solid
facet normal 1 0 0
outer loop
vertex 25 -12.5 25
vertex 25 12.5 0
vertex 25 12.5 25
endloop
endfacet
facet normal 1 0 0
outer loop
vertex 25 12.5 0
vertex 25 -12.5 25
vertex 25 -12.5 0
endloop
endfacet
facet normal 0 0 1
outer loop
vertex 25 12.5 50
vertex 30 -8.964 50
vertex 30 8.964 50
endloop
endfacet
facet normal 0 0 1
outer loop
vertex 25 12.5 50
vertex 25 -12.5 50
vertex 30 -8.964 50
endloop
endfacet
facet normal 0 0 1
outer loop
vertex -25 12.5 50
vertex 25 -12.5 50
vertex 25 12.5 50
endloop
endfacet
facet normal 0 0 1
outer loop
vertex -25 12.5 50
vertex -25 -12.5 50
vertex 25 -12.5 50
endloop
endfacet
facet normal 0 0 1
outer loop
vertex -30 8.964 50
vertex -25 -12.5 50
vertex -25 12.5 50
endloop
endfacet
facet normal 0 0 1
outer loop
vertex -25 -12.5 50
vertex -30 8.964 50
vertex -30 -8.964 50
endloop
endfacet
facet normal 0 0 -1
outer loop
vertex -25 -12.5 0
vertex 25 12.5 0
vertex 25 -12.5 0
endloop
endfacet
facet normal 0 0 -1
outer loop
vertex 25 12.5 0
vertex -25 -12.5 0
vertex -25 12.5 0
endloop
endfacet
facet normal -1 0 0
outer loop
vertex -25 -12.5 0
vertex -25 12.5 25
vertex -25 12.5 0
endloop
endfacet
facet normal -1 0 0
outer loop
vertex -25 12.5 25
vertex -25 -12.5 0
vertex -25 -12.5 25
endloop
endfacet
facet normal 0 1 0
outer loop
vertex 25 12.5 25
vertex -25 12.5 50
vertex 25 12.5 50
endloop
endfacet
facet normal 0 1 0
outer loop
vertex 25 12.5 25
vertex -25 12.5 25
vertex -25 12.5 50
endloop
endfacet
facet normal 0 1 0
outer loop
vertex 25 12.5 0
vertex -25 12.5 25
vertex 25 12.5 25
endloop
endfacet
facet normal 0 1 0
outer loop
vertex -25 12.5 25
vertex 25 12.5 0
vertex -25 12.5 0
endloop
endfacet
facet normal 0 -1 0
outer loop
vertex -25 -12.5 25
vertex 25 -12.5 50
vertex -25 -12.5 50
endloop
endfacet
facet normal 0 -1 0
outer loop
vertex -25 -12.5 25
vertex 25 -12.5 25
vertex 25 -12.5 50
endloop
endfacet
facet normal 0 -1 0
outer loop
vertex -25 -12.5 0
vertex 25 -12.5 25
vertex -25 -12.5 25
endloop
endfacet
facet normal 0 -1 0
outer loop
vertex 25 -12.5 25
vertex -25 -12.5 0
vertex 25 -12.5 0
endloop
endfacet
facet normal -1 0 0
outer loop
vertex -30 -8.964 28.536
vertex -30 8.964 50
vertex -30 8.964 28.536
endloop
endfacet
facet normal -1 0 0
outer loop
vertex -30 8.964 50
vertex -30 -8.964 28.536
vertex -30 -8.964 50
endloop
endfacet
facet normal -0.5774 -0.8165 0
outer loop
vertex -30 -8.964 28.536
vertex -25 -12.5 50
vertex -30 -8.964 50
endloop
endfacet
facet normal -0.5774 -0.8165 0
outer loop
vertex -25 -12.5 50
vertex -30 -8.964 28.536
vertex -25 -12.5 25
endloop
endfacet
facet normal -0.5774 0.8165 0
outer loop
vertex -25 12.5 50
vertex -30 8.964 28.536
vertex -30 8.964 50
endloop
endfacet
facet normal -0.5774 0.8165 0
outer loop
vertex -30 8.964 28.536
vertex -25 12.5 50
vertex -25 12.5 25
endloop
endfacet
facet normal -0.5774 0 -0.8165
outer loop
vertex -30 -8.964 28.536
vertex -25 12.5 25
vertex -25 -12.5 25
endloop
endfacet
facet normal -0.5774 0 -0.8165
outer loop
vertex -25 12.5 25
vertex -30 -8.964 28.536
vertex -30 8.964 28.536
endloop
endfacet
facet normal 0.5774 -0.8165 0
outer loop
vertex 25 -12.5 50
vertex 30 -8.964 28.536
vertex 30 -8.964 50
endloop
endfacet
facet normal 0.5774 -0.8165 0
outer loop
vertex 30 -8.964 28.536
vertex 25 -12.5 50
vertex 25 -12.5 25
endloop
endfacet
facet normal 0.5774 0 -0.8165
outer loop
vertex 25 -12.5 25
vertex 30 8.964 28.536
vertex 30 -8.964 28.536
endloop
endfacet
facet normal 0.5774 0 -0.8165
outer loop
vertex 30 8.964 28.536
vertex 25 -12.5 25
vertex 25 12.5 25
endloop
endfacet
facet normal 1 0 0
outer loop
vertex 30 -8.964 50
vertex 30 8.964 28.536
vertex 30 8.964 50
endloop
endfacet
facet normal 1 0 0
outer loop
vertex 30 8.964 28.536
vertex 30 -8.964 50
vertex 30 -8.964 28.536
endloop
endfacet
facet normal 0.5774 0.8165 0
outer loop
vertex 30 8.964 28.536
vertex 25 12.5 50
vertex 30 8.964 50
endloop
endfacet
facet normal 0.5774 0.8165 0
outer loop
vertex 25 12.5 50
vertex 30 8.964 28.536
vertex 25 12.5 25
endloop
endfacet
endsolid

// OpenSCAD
// file: plus/parts.scad
//////////////////////////////////////////////////////////////////////////////////////////////////
// parts [OBLOBOTS] 
// v.04 
// partes que estarán integradas en los volúmenes
//////////////////////////////////////////////////////////////////////////////////////////////////
// (c) Jorge Medal (@oblomobka) - Sara Alvarellos (@trecedejunio) Sep 2013
//////////////////////////////////////////////////////////////////////////////////////////////////
// GPL license ???
//////////////////////////////////////////////////////////////////////////////////////////////////

use <union.scad>

//-- sizes Buttons

PON = [11.7,2.35,0,0,11.7,1.6 ];	// [ diametro H, espesor H, d centro H, saliente H, diámetro M, espesor M]
PRY = [11,2.2,0,0,11,2.0 ];		// [ diametro H, espesor H, d centro H, saliente H, diámetro M, espesor M]
COS11 = [10,1.3,3.5,3,9.6,0.7];	// [ diámetro H, espesor H, d centro H, saliente H, diámetro M, espesor M]

////////////////////////////////////////////////////////
////////////////////// VOLÚMENES /////////////////////////

// --- Cono truncado ciego falda 45º
module blindcone (d=50	// diámetro del cono
				){

$fn=50;
union(){
	difference(){
		cylinder (r1=d/2,r2=d/4,h=d/4);
		translate([0,0,(d/4-7*d/32)+0.1])
			cylinder (r1=0,r2=7*d/32,h=7*d/32);
		}
	cylinder (r1=7*d/32,r2=d/32,h=7*d/32);
	}
}


// --- Piramide circunscrita en un círculo definido en las variables
module pyramid_C (	n=4,			// nº lados de la base de la pirámide	
					d1=20,		// diámetro del círculo-base donde se inscribe la pirámide
					d2=0,		// diámetro del círculo-punta donde se inscribe la pirámide
					h=10			// altura de la pirámide
					){

if(n%2==0){
rotate([0,0,180/n])
	cylinder (r1=d1/2/cos(180/n), r2=d2/2/cos(180/n), h=h, $fn=n);
}
else{
	rotate([0,0,90/n])
		cylinder (r1=d1/2/cos(180/n), r2=d2/2/cos(180/n), h=h, $fn=n);
}

}

// ------- pyramid_C (n=n,d1=d1,d2=d2,h=h); -----------------

// --- Prisma circunscrit0 en un círculo definido en las variables
module prism_C (	n=4,			// nº lados de la base del prisma
				d=20,		// diámetro del círculo donde se inscribe el prisma
				h=10			// altura del prisma
				){
if(n%2==0){
rotate([0,0,180/n])
	cylinder (r=d/2/cos(180/n), h=h, $fn=n);
}
else{
	rotate([0,0,90/n])
	cylinder (r=d/2/cos(180/n), h=h, $fn=n);
}

}

// ------- prism_C (n=n,d=d,h=h); -----------------


////////////////////////////////////////////////////////
////////////////////// DECORACIÓN /////////////////////////

module badge_f (	n=5,			// nº lados de la base de la pirámide	
				d=20,		// diámetro del círculo-base donde se inscribe la pirámide
				h=3,			// altura de la pirámide
				button=0,	// si =1 se construira un rebaje para un botón automático
				typ			// tipo de botón automático
				){
d2=d-2*h;

if(n%2==0){
	rotate([0,0,180/n])
		cylinder (r1=d/2/cos(180/n), r2=d2/2/cos(180/n), h=h, $fn=n);
	}
	else{
		rotate([0,0,90/n])
			cylinder (r1=d/2/cos(180/n), r2=d2/2/cos(180/n), h=h, $fn=n);
		}

	if(button==1){
		translate([0,0,h])
			auto_button_m0(typ);
		}
}
// ------- shield_f (n=n,d=d,h=h,button=button,typ=[typ]); -----------------


module badge_m (	n=5,			// nº lados de la base de la pirámide	
				d=19,		// diámetro del círculo-base donde se inscribe la pirámide
				h=3,			// altura de la pirámide
				B=1,			// Tipo de escudo
				button=0,	// si =1 se construira un rebaje para un botón automático
				typ			// tipo de botón automático
				){
$fn=50;

d2=d-2*h;

difference(){
	union(){
		pyramid_C (n=n,d1=d,d2=d2,h=h);
		if(B==1||B==2){
			mirror([0,0,1])
				hull(){
					prism_C (n=n,d=d,h=0.5);
	
					translate([0,0,d/4])
						if(B==1){
							cylinder(r=d/4,h=1);
							}
							else{
								if(B==2){
									sphere(d/4);
								}
							}
					}
				}
		else{
		if(B==3){
			mirror([0,0,1])
				difference(){
					prism_C(d=d,h=6,n=n);
					translate ([0,0,1])
						prism_C(d=d-5,h=6,n=n);
					}
			}	
		}
	}
	if(button==1){
		translate([0,0,h])
			rotate([0,180,0])
				auto_button_f0(typ);
		}
	else{}
	if(B==1){
		translate([0,0,-(d/4+3)])
			prism_C(d=d/3,h=6,n=n);
		}
	}
}

// ------- badge_m (B=B,n=n,d=d,h=h,button=button,typ=[typ]); -----------------

/////////////////////////////////////////////////////////
////////// MÓDULOS PARA ALOJAR LEDS  ////////////////////

// Cono truncado hueco. Funciona como alojamiento para un led
module ledsocket (	ledn=5,		// Valor nominal del led
					h=4			// altura del cono						
					){
$fn=50;
hi=1.2;
edge=1;					// borde del ojo
ledr=ledn+1;
socket=ledr+1;
lash=socket+2*edge;
fring=1;					// factor que define la falda del cono 1=45º
ring=lash+2*h*fring;

	difference(){

		cylinder(r2=lash/2,r1=ring/2,h=h);

		union(){
			cylinder(r2=ledr/2,r1=socket/2,h=hi+0.1);

			translate([0,0,hi])
				cylinder(r2=socket/2,r1=ledr/2,h=h-hi);

			translate([0,0,h-0.1])
				cylinder(r=socket/2, h=2);

			translate([0,0,-2])
				cylinder(r=socket/2, h=2.1);
		}
	}
}


// Cono truncado hueco. Funciona como alojamiento para un led
module ledsocket_exp(	ledn=5,		// Valor nominal del led
					h=4,			// altura del cono
					exp1=-25,	// [-45:45]	factor para la expresión
					exp2=50		// [1:100]	factor para la expresión
					){
$fn=50;
hi=1.2;
ledr=ledn+1;
socket=ledr+1;
edge=1;							// borde del ojo
lash=socket+2*edge;
fring=1;							// factor que define la falda del cono 1=45º
ring=lash+2*h*fring;

eyer2=socket+2*edge;				// Variable auxiliar
eyer1=eyer2+2*h*fring;			// Variable auxiliar

cut=((eyer1-eyer2)/2)*exp2/100;		// Variable auxiliar

difference(){	
	difference(){
		cylinder(r2=lash/2,r1=ring/2,h=h);
		union(){
			cylinder(r2=ledr/2,r1=socket/2,h=hi+0.1);
			translate([0,0,hi])
				cylinder(r2=socket/2,r1=ledr/2,h=h-hi);
			translate([0,0,h-0.1])
				cylinder(r=socket/2, h=2);
			translate([0,0,-0.1])
				cylinder(r=socket/2, h=0.2);
			}
		}
	translate ([0,0,h/2])
		rotate ([0,0,exp1])
			translate ([0,eyer1/2+eyer2/2+0.5+cut,0])	
				cube ([eyer1,eyer1,eyer1],center=true);						
	}
}

// -------------- Fin de los módulos para alojar leds ---------------------
// ------------------------------------------------------------------------


/////////////////////////////////////////////////////////////////////////
/////////////////// Ejemplos de aplicación //////////////////////////////

*badge_f(button=1,typ=COS11);

translate ([0,-30,0])
badge_m(B=1, button=1,typ=COS11);

translate ([0,-60,0])
badge_m(B=2,button=1,typ=COS11);

translate ([0,-90,0])
badge_m(B=3,button=1,typ=COS11);


blindcone (d=25);	
translate ([0,30,0])
	blindcone (d=12);	
translate ([0,60,0])
	blindcone (d=30);	

translate ([40,0,0])
	pyramid_C (n=6,d1=20,d2=10,h=10);
translate ([40,30,0])
	pyramid_C (n=4,d1=30,d2=0,h=20);
translate ([40,60,0])
	pyramid_C (n=5,d1=23,d2=5,h=34);
					
translate ([-40,0,0])
	ledsocket_exp (ledn=5,h=6,exp1=-45,exp2=20);


translate ([-40,30,0])
	ledsocket_exp (ledn=5,h=4,exp1=25,exp2=40);
translate ([-40,60,0])
	ledsocket_exp (ledn=5,h=2,exp1=0,exp2=100);
// file: plus/union.scad
//////////////////////////////////////////////////////////////////////////////////////////////////
// union [OBLOBOTS] 
// v.04 
// elementos de unión entre las partes del cuerpo de los oblobots
//////////////////////////////////////////////////////////////////////////////////////////////////
// (c) Jorge Medal (@oblomobka) - Sara Alvarellos (@trecedejunio) Sep 2013
//////////////////////////////////////////////////////////////////////////////////////////////////
// GPL license
//////////////////////////////////////////////////////////////////////////////////////////////////

use <parts.scad>

//////////////////////////////////////////////////////
////////// MÓDULOS TIPO MACHO-HEMBRA /////////////////

/////////// MACHOS ///////////

// ---- Pin cilíndrico simple. Tiene un ligero achafalnado en la punta
module pin0(	d=15,	// diámetro del pin
			h=10	,	// longitud del pin
			db1=0,	// diámetro de la base1
			db2=0,	// diámetro de la base2 si es =db1 es un cilindro
			hb=0	,	// longitud de la base
			n=32		// número de lados del prisma base
			){
$fn=50;
h1=1;
h2=h-h1;

translate([0,0,hb])
union(){
	cylinder(r=d/2, h=h2);
	translate([0,0,h2])
		cylinder (r1=d/2,r2=(d-2)/2,h=h1);
	translate([0,0,-hb])
	pyramid_C(d1=db1,d2=db2,h=hb,n=n);
	}
	
}

// --- pin que se ensancha en la punta
module pin2 (	d=8,	// diámetro del taladro
				h=20	,	// longitud del pin
				db1=0,	// diámetro de la base1
				db2=0,	// diámetro de la base2 si es =db1 es un cilindro
				hb=0	,	// longitud de la base
				n=0,		// número de lados del prisma base
				k=0.3,	// marca el espesor de la pestaña
				s=0.3	// holgura
				){
$fn=50;

dp=d+0.8;
hp=h/10;
space=s;
k1=d*k;

translate([0,0,hb])
difference(){
union(){
cylinder(r=(d-space)/2,h=h/2);
translate([0,0,h/2])
cylinder(r1=(d-space)/2,r2=(dp-space)/2,h=h/2-h/10);
translate([0,0,h-h/10])
	cylinder (r1=(dp-space)/2,r2=(d-1)/2,h=h/10-0.5);
translate([0,0,-hb])
	pyramid_C(d1=db1,d2=db2,h=hb,n=n);
}

translate([0,0,h])
for(i=[90,180]){
	rotate([0,0,i])
		union(){
			cube([2*d,d/8,h],center=true);
			translate([0,0,-h/2])rotate([90,0,0])
				cylinder(r=d/16,h=2*d,center=true);
			}
	}

cylinder(r=k1/2,h=3*h, center=true);
}

}


////////// HEMBRAS ////////////////////

// --- Taladro poligonal para volumen macizo
module drill0 (	d=12,	// diámetro del taladro
				h=6		// profundidad del taladro
				){
$fn=50;
s=6;			// Nº de lados del taladro (el taladro es poligonal, normalmente será hexagonal)

translate([0,0,-0.2])
	intersection(){
		cylinder (r=(d/cos(180/s))/2,h=h,$fn=s);
		cylinder (r=(d+d/20)/2,h=h);
	}
}

// --- Taladro poligonal para volumen hueco - Añade una caña donde alojar el pin
module drill1 (	d=12,	// diámetro del taladro
				h=15		// profundidad del taladro
				){
$fn=50;
s=6;			// Nº de lados del taladro (el taladro es poligonal, normalmente será hexagonal)
e=3;			// espesor de la caña donde se alojará el pin correspondiente

difference(){
	child (0);
	cylinder (r=(d+2*e)/2,h=2*h,center=true);	
	}

difference(){
	cylinder (r=(d+e)/2,h=h);
	translate([0,0,-1])
		intersection(){
			cylinder (r=(d/cos(180/s))/2,h=h,$fn=s);
			cylinder (r=(d+d/20)/2,h=h);
		}
	}
}


// --- Taladro que se ensancha en la punta
module drill2 (	d=12,	// diámetro del taladro
				h=25		// profundidad del taladro
				){
$fn=50;

dp=d+0.8;
hp=h/10;

union(){
	translate([0,0,-0.5])
		cylinder(r=d/2,h=0.5+h/2);
	translate([0,0,(h-0.05)/2])
		cylinder(r1=d/2,r2=dp/2,h=h/2-h/10);
	translate([0,0,h-h/10-0.025])
		cylinder (r1=dp/2,r2=(d-1)/2,h=h/10);
	}
}

// --- Taladro que se ensancha en la punta con caña
module drill3 (	d=12,	// diámetro del taladro
				h=25		// profundidad del taladro
				){
$fn=50;

dp=d+0.8;
hp=h/10;
e=1.5;				// espesor de la caña donde se alojará el pin correspondiente

difference(){
	child (0);
	color("red")
	cylinder (r=(d+2*e)/2,h=2*h,center=true);	
	}

color("green")
difference(){
	cylinder (r=(d+2*e)/2,h=h);
	union(){
	translate([0,0,-0.5])
		cylinder(r=d/2,h=0.5+h/2);
	translate([0,0,(h-0.05)/2])
		cylinder(r1=d/2,r2=dp/2,h=h/2-h/10);
	translate([0,0,h-h/10-0.025])
		cylinder (r1=dp/2,r2=(d-1)/2,h=h/10);
	}
}
}

// -------------- Fin de los módulos tipo macho-hembra --------------------
// ------------------------------------------------------------------------

//////////////////////////////////////////////////////
////////// MÓDULOS TIPO BOTÓN AUTOMÁTICO /////////////

////////// HEMBRAS ////////////////////

// Dibuja un cilindro que se debe restar del bloque principal donde se colocará el botón

module auto_button_f0 (	typ,		// Tipo de botón
						c=0.1		// corrección, para ajustar el diámetro
						){

e=2;			// pared

h=typ[1]+0.1;
d=typ[0]+c;

hs=max(0,typ[3]-h);
ds=typ[2];

$fn=50;

translate([0,0,-0.1])
union(){
cylinder (r=d/2,h=h);
translate([0,0,h+0.3])
cylinder (r=ds/2,h=hs);
}	
}

// Asociado al modelo principal (como si fuera una modificación) resta y añade el alojamiento del botón
module auto_button_f1 (	typ,		// Tipo de botón
						c=0		// corrección, para ajustar el diámetro

						){

e=2;			// pared
	
h=typ[1];
d=typ[0]+c;

$fn=50;

difference(){
	child (0);
	cylinder (r=(d+2*e)/2,h=2*(h+e),center=true);	
	}

difference(){
	cylinder (r=(d+2*e)/2,h=h+e);
	translate([0,0,-0.1])
		cylinder (r=d/2,h=h);
			
		}
}


/////////// MACHOS ///////////

// Dibuja un cilindro que se debe restar del bloque principal donde se colocará el botón
module auto_button_m0 (	typ,		// Tipo de botón
						c=0		// corrección, para ajustar el diámetro
						){

h=typ[5]+0.3;
d=typ[4]+c;

$fn=50;

translate([0,0,-0.1])
cylinder (r=d/2,h=h);			
}

// Asociado al modelo principal (como si fuera una modificación) resta y añade el alojamiento del botón
module auto_button_m1 (	typ,		// Tipo de botón
						c=0		// corrección, para ajustar el diámetro
						){

e=2;			// pared	

h=typ[5];
d=typ[4]+c;

$fn=50;

difference(){
	child (0);
	cylinder (r=(d+2*e)/2,h=2*(h+e),center=true);	
	}

difference(){
	cylinder (r=(d+2*e)/2,h=h+e);
	translate([0,0,-0.1])
		cylinder (r=d/2,h=h);
			
		}
}

// Asociado al modelo principal (como si fuera una modificación) resta y añade el alojamiento del botón
// añade un pedestal en el volumen principal

module auto_button_m2 (	typ,		// Tipo de botón
						c=0,		// corrección, para ajustar el diámetro
						hb=0,	// longitud de la base
						db=15,	// diámetro de la base
						n=8,		// número de lados del prisma base
						z=0		// posiciona la pieza en altura
						){

//e=2;			// pared	

h=typ[5]+0.3;;
d=typ[4]+c;


ht=h+hb;

$fn=50;

difference(){
	child (0);
	translate([0,0,z+0.05])
	translate([0,0,-h+hb])
		cylinder (r=d/2,h=h);	
	}


translate([0,0,z-h])
difference(){
	prism_C(d=db,h=ht,n=n);
	translate([0,0,+0.05+hb])
		cylinder (r=d/2,h=h);	
	}
}

/////////////////////////////////////////////////////////////////////////
/////////////////// Ejemplos de aplicación //////////////////////////////


//-- sizes Buttons

PON = [11.7,2.35,0,0,11.7,1.6 ];	// [ diametro H, espesor H, d centro H, saliente H, diámetro M, espesor M]
PRY = [11,2.2,0,0,11,2.0 ];		// [ diametro H, espesor H, d centro H, saliente H, diámetro M, espesor M]
COS11 = [10,1.3,3.5,3,9.6,0.7];	// [ diámetro H, espesor H, d centro H, saliente H, diámetro M, espesor M]
							
// main file
//////////////////////////////////////////////////////////////////////////////////////////////
// body [OBLOBOTS] 
// 
// v.04
//////////////////////////////////////////////////////////////////////////////////////////////////
// (c) Jorge Medal (@oblomobka) - Sara Alvarellos (@trecedejunio) Sep 2013
//////////////////////////////////////////////////////////////////////////////////////////////////
// GPL license
//////////////////////////////////////////////////////////////////////////////////////////////////

use <plus/union.scad>
use <plus/parts.scad>


//////////////////////////////////////////////////////////////////
/////////////////// MODULO trunkQ  ////////////////////////////////

module trunkQ (	tr=[50,25,50],		// medida del cuerpo: ancho
				T=1					// Tipo de hombro:	1 -> 3 chaflanes
									//					2 -> 4 chaflanes
				)
				{

$fn=50;

trx=tr[0];
try=tr[1];
trz=tr[2];

sx=trx/10;
sy=try;
sz=max(24,trz/2);

// --------- Volumen ----------------

union(){
translate ([0,0,trz/2])
	cube (tr,center=true);

// hombros
translate([-trx/2,0,trz-sz])
	shoulder (S=T,sx=sx,sy=sy,sz=sz);

mirror([1,0,0])translate([-trx/2,0,trz-sz])
	shoulder (S=T,sx=sx,sy=sy,sz=sz);
	
}


// ----- Modulos auxiliares ------------

module shoulder(S=1,sx,sy,sz){

ang=45;		//[0:45]

// paralepipedo achflanado en 3 lados	
if(S==1){
	rotate([0,-90,0])translate ([sz/2,0,0])
	hull(){
		translate ([0,0,-0.05])
			cube([sz,sy,0.1],center=true);
		translate ([sx*cos(ang)/2,0,sx/2])
			cube([sz-sx*cos(ang),sy-2*sx*cos(ang),sx],center=true);
		}
	}

// paralepipedo achflanado en 4 lados
	else{
		if(S==2){
			rotate([0,-90,0])translate ([sz/2,0,0])
			hull(){
				translate ([0,0,-0.05])
					cube([sz,sy,0.1],center=true);
				translate ([0,0,sx/2])
					cube([sz-2*sx*cos(ang),sy-2*sx*cos(ang),sx],center=true);
			}
		}	
}
}

// ----- Fin de los módulos auxiliares ------------

}

// -------------- Fin del módulo trunkQ() ----------------------------------
// ------------------------------------------------------------------------



trunkQ(T=1);
